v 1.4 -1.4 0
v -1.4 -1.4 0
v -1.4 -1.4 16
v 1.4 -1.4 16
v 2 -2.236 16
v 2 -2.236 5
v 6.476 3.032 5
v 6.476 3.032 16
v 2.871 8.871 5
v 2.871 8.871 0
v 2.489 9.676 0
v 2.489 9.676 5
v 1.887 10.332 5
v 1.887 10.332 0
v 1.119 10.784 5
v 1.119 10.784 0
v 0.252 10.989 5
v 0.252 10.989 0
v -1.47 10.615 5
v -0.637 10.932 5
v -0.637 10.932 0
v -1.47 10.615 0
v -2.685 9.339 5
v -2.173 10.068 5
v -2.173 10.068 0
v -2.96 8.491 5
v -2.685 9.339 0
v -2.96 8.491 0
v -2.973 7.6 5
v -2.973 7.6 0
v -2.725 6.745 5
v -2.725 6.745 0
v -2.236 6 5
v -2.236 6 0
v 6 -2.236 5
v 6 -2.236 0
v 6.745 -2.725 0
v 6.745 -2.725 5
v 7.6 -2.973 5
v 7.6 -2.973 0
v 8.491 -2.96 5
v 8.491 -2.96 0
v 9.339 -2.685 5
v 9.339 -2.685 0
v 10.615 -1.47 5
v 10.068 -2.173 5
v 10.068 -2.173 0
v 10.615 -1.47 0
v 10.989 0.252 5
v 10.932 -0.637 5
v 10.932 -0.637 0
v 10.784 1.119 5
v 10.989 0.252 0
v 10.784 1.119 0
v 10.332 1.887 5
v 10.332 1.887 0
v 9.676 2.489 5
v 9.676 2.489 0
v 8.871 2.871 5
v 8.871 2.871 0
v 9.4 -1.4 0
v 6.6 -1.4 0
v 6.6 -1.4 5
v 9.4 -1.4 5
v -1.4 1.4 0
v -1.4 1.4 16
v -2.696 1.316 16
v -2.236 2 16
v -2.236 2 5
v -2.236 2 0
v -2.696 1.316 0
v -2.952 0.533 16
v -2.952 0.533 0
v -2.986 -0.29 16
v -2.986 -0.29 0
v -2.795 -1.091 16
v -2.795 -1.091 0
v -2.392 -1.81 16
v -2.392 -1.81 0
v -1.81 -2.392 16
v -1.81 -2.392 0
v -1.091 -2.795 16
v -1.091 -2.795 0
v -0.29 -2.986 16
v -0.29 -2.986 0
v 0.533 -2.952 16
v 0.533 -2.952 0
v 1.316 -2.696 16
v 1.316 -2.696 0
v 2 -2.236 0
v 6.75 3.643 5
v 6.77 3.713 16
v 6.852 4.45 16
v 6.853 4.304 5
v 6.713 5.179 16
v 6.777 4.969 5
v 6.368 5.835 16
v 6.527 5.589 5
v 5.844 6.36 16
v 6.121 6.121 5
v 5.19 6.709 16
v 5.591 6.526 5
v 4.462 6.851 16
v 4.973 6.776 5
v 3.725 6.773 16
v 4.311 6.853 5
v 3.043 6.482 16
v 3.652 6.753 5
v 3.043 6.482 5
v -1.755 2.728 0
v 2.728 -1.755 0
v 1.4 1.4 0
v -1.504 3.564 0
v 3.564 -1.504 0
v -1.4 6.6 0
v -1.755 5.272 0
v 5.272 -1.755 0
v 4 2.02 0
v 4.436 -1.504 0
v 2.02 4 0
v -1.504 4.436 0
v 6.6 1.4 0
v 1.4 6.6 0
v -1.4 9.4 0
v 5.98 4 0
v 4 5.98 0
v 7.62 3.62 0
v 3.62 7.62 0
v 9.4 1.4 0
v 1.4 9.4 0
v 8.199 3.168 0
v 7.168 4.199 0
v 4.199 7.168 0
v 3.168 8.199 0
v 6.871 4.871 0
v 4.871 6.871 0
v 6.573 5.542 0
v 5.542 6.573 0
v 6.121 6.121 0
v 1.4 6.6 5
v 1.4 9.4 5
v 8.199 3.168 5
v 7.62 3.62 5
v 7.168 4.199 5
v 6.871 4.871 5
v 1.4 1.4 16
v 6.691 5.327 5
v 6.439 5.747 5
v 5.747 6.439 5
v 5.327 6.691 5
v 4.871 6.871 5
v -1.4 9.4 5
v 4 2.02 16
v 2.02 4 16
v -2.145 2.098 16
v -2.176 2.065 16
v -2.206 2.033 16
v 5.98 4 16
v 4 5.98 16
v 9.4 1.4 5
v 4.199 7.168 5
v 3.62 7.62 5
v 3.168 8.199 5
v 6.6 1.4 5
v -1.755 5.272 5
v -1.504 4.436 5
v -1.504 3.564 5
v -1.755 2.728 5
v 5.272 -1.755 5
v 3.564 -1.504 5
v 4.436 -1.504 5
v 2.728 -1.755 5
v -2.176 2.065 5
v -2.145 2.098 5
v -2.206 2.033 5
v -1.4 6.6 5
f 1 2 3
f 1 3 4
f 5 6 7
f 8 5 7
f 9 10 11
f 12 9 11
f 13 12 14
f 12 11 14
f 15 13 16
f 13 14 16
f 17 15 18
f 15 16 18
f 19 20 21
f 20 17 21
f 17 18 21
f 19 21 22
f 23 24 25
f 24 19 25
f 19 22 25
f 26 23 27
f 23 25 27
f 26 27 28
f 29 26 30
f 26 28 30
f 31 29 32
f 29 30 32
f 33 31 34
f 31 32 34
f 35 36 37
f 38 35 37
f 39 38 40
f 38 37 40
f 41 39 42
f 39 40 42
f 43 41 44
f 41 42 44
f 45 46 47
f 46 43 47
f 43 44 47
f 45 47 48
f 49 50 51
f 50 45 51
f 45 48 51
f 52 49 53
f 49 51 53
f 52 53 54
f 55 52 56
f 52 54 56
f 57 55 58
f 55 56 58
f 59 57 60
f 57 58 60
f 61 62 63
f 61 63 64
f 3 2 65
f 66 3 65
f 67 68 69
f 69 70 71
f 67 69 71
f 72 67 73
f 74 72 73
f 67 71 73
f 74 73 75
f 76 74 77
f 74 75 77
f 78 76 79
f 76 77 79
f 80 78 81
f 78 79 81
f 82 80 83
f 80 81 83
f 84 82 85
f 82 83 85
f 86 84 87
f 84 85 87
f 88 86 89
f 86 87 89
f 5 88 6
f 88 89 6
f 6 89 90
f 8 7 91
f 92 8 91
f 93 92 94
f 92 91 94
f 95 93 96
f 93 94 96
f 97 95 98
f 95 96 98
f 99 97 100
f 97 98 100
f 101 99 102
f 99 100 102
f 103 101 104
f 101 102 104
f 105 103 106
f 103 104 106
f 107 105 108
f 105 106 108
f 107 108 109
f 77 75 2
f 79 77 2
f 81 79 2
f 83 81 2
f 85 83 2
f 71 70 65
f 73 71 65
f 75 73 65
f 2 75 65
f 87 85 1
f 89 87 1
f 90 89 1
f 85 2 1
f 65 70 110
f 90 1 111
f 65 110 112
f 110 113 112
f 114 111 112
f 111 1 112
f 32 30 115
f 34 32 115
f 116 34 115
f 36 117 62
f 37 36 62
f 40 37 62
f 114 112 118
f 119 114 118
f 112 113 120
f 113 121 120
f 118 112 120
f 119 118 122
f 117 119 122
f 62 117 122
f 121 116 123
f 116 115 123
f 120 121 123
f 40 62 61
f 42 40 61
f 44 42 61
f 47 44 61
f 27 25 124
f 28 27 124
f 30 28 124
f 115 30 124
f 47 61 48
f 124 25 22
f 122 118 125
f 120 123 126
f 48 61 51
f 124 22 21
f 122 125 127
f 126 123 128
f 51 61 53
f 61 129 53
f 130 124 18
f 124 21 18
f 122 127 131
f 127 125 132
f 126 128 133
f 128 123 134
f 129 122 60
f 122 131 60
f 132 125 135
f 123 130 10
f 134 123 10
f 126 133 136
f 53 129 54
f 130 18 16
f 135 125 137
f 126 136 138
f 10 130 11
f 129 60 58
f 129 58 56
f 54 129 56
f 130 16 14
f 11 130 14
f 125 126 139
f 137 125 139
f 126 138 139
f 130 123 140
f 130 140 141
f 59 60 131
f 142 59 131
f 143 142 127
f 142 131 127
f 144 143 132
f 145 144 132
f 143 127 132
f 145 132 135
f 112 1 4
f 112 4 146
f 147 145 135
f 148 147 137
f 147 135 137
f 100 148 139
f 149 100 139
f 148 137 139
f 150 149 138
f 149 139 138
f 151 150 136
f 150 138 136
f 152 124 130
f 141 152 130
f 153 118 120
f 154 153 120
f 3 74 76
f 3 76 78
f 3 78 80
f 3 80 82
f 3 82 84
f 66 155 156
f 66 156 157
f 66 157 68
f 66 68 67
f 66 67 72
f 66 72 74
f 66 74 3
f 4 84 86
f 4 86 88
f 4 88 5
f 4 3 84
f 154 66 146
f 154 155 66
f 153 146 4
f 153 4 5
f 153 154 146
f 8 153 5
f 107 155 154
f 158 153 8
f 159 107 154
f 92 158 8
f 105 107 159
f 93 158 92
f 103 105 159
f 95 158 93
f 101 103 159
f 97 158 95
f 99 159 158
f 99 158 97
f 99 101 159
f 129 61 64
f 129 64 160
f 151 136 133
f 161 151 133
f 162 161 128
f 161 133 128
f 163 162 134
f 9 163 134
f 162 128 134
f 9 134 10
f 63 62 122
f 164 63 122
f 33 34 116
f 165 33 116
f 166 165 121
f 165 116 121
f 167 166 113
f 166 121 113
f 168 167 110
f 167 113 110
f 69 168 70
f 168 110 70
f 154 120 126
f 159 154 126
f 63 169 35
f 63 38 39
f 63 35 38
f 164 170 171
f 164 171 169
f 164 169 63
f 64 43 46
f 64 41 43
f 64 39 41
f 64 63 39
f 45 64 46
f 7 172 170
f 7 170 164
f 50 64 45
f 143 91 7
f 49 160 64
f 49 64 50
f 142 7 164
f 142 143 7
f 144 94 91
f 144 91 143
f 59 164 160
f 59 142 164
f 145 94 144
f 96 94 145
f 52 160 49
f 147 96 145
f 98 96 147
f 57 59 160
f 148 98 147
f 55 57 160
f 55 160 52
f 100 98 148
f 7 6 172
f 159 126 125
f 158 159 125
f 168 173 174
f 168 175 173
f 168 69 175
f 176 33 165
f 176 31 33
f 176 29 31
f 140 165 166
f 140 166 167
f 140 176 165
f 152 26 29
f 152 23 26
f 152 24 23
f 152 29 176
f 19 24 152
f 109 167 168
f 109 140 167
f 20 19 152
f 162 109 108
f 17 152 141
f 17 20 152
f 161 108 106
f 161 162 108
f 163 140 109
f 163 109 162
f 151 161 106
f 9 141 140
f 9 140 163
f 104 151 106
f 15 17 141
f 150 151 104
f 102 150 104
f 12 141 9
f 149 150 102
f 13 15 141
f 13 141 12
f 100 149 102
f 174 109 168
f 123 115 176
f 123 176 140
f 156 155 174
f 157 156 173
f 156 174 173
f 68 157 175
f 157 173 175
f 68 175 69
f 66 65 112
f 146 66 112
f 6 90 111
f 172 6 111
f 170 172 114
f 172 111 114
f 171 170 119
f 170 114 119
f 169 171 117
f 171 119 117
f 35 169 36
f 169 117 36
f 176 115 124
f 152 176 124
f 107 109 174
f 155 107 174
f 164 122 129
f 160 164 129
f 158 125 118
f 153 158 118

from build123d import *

# Parameters (mm, degrees)
ESBO_O1_W                  = 2.8
ESBO_O1_H                  = 2.8
RESSALTO_EXTRUS_O1_DEPTH   = 16
CORTE_EXTRUS_O_FINA1_START = -11
CORTE_EXTRUS_O_FINA1_DEPTH = 11


with BuildPart() as part:
    # Esboço1 → Ressalto-extrusão1 (new body)
    with BuildSketch(Plane.XY):
        with BuildLine():
            ThreePointArc((2.870828693, 8.870828693), (-1.470083208, 10.615120525), (-2.236067977, 6))
            ThreePointArc((-2.236067977, 6), (-1.472135955, 4), (-2.236067977, 2))
            ThreePointArc((-2.236067977, 2), (-2.121320344, -2.121320344), (2, -2.236067977))
            ThreePointArc((2, -2.236067977), (4, -1.472135955), (6, -2.236067977))
            ThreePointArc((6, -2.236067977), (10.615120525, -1.470083208), (8.870828693, 2.870828693))
            ThreePointArc((8.870828693, 2.870828693), (7.620337043, 3.620337043), (6.870828693, 4.870828693))
            ThreePointArc((6.870828693, 4.870828693), (6.121320344, 6.121320344), (4.870828693, 6.870828693))
            ThreePointArc((4.870828693, 6.870828693), (3.620337043, 7.620337043), (2.870828693, 8.870828693))
        make_face()
        with Locations((0, 8)):
            Rectangle(ESBO_O1_W, ESBO_O1_H, mode=Mode.SUBTRACT)
        Polygon((4, 5.979898987), (5.979898987, 4), (4, 2.020101013), (2.020101013, 4), align=None, mode=Mode.SUBTRACT)
        with Locations((8, 0)):
            Rectangle(ESBO_O1_W, ESBO_O1_H, mode=Mode.SUBTRACT)
        Rectangle(ESBO_O1_W, ESBO_O1_H, mode=Mode.SUBTRACT)
    extrude(amount=RESSALTO_EXTRUS_O1_DEPTH)

    # Esboço2 → Corte-Extrusão-Fina1 (cut)
    with BuildSketch(Plane.XY.offset(16).offset(CORTE_EXTRUS_O_FINA1_START)):
        with BuildLine():
            Line((9.333446825, -9.049130918), (14.39222363, -3.094607445))
            ThreePointArc((14.39222363, -3.094607445), (13.208027354, 13.176721236), (-3.059004987, 14.418541135))
            Line((-3.059004987, 14.418541135), (-8.835216439, 9.536191613))
            ThreePointArc((-8.835216439, 9.536191613), (-9.295999773, -9.087595294), (9.333446825, -9.049130918))
        make_face()
        with BuildLine():
            Line((2, -2.236067977), (6.47600505, 3.032493606))
            ThreePointArc((6.47600505, 3.032493606), (6.125574464, 6.117055961), (3.04273657, 6.482346303))
            Line((3.04273657, 6.482346303), (-2.144816713, 2.09756079))
            ThreePointArc((-2.144816713, 2.09756079), (-2.16802388, -2.073565156), (2, -2.236067977))
        make_face(mode=Mode.SUBTRACT)
    extrude(amount=CORTE_EXTRUS_O_FINA1_DEPTH, mode=Mode.SUBTRACT)


solid = part.part
